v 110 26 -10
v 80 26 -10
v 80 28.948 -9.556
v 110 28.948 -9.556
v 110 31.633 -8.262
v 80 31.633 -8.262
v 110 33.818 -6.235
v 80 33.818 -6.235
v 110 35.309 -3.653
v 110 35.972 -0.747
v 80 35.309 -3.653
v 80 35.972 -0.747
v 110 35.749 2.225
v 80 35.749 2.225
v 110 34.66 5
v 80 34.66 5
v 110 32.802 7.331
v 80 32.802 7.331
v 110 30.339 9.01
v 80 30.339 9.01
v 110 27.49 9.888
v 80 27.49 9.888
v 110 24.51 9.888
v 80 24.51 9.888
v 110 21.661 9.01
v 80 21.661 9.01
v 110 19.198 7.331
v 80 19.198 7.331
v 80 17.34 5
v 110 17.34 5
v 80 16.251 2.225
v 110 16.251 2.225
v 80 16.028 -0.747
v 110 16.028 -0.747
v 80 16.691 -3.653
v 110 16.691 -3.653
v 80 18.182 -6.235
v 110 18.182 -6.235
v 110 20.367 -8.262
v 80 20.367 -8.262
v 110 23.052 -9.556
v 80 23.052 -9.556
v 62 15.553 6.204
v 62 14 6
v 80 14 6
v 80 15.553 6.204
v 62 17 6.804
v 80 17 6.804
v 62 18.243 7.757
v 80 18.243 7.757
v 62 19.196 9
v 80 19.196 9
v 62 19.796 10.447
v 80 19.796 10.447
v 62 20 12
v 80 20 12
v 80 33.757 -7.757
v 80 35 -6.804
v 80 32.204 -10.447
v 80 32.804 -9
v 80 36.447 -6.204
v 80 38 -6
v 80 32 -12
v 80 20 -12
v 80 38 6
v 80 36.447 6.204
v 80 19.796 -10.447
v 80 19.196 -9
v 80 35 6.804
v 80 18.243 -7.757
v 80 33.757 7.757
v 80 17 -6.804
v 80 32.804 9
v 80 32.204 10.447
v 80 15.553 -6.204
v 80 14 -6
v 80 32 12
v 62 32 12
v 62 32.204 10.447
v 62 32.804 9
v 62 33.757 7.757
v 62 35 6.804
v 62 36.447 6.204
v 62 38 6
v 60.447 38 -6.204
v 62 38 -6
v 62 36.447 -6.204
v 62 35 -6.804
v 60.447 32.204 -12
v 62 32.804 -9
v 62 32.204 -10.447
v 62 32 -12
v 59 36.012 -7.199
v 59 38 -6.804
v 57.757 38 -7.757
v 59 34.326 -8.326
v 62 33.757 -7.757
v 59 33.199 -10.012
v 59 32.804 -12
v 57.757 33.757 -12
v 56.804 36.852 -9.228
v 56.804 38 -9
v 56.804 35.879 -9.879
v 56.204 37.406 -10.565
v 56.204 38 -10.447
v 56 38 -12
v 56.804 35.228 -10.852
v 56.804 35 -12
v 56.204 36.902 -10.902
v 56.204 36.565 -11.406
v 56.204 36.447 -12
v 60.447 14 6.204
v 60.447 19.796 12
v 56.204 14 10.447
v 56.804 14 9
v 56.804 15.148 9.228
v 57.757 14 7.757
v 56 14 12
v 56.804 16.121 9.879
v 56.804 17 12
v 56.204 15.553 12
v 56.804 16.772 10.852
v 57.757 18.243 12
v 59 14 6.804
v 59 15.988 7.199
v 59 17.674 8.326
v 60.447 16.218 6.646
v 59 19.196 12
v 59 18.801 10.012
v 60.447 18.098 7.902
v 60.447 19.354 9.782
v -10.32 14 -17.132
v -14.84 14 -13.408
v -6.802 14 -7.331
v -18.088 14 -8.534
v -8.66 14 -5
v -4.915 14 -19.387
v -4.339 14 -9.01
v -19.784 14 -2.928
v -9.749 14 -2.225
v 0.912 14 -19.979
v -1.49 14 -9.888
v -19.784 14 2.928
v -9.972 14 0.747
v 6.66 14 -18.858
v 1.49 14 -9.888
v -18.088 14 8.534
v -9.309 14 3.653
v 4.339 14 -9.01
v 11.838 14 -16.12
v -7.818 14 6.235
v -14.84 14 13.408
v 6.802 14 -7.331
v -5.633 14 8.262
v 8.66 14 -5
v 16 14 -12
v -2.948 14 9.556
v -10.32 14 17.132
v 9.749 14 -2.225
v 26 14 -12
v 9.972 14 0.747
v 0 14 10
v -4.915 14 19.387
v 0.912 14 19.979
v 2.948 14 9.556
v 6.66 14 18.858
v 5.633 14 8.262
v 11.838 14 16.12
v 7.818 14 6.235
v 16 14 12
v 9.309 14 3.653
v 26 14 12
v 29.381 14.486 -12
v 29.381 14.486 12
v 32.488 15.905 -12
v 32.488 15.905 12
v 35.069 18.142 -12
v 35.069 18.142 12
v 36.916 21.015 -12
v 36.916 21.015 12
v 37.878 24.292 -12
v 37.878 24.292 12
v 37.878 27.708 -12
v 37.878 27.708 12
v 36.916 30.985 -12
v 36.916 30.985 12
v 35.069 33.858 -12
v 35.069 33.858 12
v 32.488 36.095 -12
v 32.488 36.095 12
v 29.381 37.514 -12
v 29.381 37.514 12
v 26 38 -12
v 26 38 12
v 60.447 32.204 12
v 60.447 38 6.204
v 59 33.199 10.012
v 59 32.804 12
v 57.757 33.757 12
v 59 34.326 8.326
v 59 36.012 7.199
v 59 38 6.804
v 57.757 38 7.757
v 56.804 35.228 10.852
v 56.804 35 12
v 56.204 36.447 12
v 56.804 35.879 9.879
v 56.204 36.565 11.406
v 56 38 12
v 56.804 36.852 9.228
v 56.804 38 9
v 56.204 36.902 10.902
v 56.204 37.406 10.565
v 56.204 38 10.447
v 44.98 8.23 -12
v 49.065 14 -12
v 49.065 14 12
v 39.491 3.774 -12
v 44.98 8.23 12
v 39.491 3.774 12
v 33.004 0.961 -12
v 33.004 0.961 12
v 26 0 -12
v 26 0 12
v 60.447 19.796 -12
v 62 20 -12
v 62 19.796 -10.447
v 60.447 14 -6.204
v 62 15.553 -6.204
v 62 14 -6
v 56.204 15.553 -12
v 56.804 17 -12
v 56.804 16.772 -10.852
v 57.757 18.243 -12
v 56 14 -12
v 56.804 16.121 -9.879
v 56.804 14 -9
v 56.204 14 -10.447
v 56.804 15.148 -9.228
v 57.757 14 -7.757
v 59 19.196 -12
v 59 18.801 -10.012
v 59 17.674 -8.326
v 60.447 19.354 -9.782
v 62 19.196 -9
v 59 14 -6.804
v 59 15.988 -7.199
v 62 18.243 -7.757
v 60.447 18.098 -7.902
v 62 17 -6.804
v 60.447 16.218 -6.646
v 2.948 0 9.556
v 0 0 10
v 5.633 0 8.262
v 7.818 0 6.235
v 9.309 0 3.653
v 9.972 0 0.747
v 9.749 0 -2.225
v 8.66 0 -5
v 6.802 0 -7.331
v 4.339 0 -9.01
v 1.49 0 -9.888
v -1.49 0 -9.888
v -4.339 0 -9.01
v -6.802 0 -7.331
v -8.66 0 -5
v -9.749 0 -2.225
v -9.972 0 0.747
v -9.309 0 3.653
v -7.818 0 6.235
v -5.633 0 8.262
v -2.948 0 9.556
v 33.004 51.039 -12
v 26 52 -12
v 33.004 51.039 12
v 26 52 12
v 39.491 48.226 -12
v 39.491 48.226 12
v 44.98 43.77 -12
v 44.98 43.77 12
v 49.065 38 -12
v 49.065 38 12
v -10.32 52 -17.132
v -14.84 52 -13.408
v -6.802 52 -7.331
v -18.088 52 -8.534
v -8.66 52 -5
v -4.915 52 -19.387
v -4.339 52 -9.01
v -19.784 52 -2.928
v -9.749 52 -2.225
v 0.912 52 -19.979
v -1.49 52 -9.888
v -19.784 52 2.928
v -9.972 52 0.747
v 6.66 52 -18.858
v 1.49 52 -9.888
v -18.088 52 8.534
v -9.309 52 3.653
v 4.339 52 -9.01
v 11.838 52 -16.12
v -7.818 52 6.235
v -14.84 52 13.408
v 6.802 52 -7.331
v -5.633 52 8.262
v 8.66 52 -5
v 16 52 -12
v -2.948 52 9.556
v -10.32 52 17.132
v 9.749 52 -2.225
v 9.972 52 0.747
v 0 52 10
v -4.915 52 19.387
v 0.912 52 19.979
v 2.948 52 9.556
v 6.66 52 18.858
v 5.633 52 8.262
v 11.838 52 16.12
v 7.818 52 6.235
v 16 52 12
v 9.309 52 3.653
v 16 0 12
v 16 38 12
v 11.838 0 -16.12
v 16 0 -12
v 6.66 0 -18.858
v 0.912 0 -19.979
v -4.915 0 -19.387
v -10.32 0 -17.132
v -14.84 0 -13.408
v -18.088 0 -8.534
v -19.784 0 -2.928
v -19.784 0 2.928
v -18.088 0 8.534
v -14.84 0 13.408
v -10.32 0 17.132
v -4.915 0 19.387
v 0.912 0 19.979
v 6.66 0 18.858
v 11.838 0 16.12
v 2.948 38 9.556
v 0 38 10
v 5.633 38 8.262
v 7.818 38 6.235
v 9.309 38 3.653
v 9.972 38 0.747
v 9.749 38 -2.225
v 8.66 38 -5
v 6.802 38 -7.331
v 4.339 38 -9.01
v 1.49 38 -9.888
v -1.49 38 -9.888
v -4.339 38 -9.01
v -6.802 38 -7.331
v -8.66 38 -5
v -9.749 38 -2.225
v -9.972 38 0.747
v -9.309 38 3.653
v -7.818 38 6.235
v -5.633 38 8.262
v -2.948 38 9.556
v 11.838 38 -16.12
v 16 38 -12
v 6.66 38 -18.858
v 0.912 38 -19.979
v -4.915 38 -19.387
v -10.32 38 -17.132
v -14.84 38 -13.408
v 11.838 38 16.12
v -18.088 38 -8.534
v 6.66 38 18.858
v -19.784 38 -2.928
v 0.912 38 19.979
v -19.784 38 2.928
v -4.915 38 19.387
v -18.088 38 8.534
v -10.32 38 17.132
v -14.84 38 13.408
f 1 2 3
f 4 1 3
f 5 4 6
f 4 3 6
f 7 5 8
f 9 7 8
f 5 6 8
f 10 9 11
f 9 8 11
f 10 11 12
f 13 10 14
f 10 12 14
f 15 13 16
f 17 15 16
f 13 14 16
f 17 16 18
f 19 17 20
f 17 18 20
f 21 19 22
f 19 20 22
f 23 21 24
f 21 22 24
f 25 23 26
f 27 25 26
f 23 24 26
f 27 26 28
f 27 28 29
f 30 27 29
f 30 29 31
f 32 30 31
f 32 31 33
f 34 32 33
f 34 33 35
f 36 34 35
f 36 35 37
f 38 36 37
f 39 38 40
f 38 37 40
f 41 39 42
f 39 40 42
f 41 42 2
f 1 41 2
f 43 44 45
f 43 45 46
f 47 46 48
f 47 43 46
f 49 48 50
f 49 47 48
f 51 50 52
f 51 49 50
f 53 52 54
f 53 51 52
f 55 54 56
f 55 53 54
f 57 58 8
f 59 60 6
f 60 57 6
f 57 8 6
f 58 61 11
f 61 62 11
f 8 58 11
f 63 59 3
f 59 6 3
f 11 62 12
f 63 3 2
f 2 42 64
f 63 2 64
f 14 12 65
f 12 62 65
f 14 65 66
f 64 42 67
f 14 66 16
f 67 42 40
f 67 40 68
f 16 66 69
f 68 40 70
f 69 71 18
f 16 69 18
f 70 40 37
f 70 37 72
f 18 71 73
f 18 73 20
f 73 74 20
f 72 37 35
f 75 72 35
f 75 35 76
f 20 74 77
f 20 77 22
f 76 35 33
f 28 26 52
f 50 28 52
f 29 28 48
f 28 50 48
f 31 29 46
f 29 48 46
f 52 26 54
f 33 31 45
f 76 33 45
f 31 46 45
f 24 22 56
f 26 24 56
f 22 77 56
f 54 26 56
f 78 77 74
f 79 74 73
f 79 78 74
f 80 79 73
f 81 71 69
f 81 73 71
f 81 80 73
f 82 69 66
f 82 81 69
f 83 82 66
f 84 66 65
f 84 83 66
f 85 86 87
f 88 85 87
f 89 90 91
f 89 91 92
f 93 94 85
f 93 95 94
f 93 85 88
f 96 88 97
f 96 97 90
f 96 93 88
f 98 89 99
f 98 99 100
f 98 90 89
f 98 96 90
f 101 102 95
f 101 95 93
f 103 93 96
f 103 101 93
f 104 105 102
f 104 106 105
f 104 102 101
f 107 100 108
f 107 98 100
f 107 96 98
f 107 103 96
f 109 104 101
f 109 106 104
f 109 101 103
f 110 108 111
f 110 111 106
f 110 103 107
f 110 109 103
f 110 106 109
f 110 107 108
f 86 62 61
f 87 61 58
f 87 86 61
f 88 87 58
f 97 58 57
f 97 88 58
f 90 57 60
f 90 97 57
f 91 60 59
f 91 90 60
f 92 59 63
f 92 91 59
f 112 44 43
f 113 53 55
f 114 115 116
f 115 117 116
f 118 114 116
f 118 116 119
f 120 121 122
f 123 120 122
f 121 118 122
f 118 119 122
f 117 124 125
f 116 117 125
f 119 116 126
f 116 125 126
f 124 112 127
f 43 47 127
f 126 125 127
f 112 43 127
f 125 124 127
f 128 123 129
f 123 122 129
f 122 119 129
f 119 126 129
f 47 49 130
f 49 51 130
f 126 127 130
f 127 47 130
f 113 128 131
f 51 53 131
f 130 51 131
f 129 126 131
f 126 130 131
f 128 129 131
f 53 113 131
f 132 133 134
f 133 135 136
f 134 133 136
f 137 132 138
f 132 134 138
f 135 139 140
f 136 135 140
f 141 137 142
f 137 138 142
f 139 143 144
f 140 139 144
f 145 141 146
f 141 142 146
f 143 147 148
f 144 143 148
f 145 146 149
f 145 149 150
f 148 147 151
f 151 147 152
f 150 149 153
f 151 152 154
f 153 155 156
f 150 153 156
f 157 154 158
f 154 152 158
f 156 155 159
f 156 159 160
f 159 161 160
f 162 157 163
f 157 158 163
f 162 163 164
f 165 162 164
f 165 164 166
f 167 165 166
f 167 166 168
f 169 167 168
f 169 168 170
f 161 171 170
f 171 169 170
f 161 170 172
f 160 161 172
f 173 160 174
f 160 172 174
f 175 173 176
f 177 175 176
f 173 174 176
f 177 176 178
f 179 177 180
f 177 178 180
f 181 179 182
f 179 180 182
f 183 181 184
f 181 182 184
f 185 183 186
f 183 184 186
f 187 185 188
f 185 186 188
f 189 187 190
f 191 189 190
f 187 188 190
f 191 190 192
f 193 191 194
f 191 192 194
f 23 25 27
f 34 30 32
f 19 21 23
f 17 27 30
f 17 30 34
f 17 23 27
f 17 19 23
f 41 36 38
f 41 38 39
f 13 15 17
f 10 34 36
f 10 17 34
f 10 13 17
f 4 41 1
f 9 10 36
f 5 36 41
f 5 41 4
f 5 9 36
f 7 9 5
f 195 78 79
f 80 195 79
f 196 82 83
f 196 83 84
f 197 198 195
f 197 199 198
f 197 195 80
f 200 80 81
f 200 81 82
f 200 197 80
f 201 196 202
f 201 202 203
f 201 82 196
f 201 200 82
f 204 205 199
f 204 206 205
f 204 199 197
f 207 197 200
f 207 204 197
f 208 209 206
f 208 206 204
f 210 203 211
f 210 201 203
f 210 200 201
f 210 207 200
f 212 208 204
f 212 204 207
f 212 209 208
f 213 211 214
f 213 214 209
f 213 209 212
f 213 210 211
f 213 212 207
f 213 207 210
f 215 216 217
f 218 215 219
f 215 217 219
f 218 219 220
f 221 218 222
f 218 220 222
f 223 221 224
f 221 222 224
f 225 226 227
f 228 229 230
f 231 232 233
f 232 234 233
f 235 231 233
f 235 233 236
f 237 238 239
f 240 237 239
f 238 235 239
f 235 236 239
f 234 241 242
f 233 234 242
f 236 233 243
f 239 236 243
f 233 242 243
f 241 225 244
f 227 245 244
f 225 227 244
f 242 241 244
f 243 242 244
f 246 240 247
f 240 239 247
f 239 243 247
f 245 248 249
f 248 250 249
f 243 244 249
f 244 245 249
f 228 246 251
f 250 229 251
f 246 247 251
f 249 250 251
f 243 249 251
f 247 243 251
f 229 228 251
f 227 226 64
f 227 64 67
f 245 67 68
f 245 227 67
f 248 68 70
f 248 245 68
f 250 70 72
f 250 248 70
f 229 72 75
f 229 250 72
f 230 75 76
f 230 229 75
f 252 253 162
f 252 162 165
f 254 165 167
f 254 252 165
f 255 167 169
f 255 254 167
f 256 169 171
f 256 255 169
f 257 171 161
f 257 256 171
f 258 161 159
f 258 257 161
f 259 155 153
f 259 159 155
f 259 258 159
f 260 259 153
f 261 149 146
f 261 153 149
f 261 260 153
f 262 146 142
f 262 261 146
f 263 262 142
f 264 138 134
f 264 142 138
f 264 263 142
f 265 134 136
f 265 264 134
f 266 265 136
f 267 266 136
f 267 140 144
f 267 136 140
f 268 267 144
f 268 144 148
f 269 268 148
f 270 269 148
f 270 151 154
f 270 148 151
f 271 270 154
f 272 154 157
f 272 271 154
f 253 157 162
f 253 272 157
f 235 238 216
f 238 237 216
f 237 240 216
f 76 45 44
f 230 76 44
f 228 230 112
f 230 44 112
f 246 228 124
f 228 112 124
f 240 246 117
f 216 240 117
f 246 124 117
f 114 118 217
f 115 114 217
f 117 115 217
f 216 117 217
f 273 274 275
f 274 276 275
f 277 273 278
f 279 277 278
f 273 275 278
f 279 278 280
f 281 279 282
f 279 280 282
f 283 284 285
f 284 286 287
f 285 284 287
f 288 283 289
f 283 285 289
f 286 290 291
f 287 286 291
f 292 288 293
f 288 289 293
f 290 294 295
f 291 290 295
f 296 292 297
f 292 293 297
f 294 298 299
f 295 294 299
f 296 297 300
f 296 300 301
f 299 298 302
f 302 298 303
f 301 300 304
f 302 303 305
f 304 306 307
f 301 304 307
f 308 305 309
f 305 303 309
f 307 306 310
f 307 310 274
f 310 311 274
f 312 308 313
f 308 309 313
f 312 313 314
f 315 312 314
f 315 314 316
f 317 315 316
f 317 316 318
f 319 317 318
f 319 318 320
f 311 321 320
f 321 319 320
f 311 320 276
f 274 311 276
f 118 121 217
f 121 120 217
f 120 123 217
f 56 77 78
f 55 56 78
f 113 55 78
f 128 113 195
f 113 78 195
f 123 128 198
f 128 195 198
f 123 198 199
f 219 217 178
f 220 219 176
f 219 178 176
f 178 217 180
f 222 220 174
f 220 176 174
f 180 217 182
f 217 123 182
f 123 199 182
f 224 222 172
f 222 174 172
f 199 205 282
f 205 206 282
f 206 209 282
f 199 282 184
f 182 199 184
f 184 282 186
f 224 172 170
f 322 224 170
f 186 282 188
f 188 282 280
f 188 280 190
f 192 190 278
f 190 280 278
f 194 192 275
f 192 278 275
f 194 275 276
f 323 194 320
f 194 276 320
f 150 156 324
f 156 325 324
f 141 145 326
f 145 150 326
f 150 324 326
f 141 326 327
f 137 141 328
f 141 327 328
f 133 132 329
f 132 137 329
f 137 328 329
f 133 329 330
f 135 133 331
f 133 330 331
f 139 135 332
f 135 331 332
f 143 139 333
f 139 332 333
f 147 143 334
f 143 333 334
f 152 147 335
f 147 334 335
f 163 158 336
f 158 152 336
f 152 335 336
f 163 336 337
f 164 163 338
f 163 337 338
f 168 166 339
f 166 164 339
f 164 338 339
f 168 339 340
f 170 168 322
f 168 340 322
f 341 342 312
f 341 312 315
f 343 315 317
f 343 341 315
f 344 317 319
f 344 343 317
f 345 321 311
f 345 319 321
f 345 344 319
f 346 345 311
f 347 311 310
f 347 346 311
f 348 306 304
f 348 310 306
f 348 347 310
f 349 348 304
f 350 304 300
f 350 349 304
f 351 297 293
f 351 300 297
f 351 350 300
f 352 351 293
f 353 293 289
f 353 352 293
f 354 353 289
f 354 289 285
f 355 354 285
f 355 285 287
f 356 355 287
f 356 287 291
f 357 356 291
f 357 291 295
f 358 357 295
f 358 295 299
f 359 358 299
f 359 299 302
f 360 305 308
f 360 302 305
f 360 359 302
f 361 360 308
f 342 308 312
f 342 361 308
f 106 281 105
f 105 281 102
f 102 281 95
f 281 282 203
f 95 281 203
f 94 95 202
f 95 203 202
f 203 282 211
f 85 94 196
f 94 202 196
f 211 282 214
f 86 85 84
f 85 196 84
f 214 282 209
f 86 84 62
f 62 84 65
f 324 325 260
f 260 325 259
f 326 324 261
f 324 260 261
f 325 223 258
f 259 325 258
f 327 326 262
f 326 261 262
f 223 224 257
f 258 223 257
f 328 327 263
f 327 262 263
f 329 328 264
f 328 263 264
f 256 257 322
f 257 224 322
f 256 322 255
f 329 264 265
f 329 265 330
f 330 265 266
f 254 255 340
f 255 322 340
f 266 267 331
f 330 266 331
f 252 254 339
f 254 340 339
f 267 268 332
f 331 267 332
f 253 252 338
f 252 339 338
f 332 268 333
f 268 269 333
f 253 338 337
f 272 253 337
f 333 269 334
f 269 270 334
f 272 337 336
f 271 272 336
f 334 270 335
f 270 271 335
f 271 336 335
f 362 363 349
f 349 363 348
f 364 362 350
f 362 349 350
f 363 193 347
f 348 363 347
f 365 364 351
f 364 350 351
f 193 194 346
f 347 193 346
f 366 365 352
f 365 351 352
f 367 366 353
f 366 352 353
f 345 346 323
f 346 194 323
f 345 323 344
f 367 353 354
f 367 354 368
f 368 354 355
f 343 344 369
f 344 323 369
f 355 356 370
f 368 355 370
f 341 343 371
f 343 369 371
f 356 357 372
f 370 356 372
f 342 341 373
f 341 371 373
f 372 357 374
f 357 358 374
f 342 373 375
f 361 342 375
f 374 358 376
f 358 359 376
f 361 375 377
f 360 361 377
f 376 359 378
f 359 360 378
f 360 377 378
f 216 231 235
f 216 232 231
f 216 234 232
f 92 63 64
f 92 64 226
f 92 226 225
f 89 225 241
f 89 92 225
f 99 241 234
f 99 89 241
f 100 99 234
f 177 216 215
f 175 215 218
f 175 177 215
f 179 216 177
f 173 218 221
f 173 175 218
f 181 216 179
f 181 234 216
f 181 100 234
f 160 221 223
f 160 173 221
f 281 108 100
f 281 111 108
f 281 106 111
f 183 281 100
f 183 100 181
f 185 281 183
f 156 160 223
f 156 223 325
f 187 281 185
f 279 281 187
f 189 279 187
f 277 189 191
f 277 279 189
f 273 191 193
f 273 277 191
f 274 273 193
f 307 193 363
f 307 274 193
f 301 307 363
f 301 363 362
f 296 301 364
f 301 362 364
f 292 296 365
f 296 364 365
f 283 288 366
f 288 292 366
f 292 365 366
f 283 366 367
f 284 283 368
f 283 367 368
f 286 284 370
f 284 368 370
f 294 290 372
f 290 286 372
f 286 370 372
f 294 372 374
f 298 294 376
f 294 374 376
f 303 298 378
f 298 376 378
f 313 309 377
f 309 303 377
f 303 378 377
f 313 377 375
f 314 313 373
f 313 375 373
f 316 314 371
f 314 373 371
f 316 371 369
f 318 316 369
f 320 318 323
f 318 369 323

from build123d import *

# Parameters (mm, degrees)
SKETCH1_R               = 20
BOSS_EXTRUDE1_DEPTH     = 52
CUT_EXTRUDE1_DEPTH      = 60.194594348
CUT_EXTRUDE1_DEPTH_BACK = 60.194594348
SKETCH2_R               = 10
BOSS_EXTRUDE8_DEPTH     = 12
SKETCH7_R               = 10
BOSS_EXTRUDE9_DEPTH     = 30
CUT_EXTRUDE2_DEPTH      = 115.47270417
CUT_EXTRUDE2_DEPTH_BACK = 24
SKETCH9_R               = 6
FILLET1_R               = 6
CUT_EXTRUDE3_DEPTH      = 124.304501177
CUT_EXTRUDE3_DEPTH_BACK = 124.304501177
SKETCH11_W              = 42.326213612
SKETCH11_H              = 24


with BuildPart() as part:
    # Sketch1 → Boss-Extrude1 (new body)
    with BuildSketch(Plane(origin=(0, 0, 0), x_dir=(1, 0, 0), z_dir=(0, 1, 0))):
        with Locations(Location((0, 0, 0), (0, 0, 90))):
            Circle(SKETCH1_R)
    extrude(amount=BOSS_EXTRUDE1_DEPTH)

    # Sketch2 → Cut-Extrude1 (cut, two sides: drawn at the far end of the back side and taken through both)
    with BuildSketch(Plane(origin=(0, 52, 0), x_dir=(1, 0, 0), z_dir=(0, 1, 0)).offset(-CUT_EXTRUDE1_DEPTH_BACK)):
        with Locations(Location((0, 0, 0), (0, 0, 270))):
            Circle(SKETCH2_R)
    extrude(amount=CUT_EXTRUDE1_DEPTH + CUT_EXTRUDE1_DEPTH_BACK, mode=Mode.SUBTRACT)

    # Sketch5 → Boss-Extrude8 (add, symmetric)
    with BuildSketch(Plane.XY):
        with BuildLine():
            Line((26, 0), (16, 0))
            Line((16, 0), (16, 14))
            Line((16, 14), (26, 14))
            ThreePointArc((26, 14), (38, 26), (26, 38))
            Line((26, 38), (16, 38))
            Line((16, 38), (16, 52))
            Line((16, 52), (26, 52))
            ThreePointArc((26, 52), (39.490737563, 48.226110771), (49.065125189, 38))
            Line((49.065125189, 38), (80, 38))
            Line((80, 38), (80, 14))
            Line((80, 14), (49.065125189, 14))
            ThreePointArc((49.065125189, 14), (39.490737563, 3.773889229), (26, 0))
        make_face()
    extrude(amount=BOSS_EXTRUDE8_DEPTH, both=True)

    # Sketch7 → Boss-Extrude9 (add)
    with BuildSketch(Plane(origin=(80, 0, 0), x_dir=(0, 0, -1), z_dir=(1, 0, 0))):
        with Locations((0, 26)):
            Circle(SKETCH7_R)
    extrude(amount=BOSS_EXTRUDE9_DEPTH)

    # Sketch9 → Cut-Extrude2 (cut, two sides: drawn at the far end of the back side and taken through both)
    with BuildSketch(Plane(origin=(80, 0, 0), x_dir=(0, 0, -1), z_dir=(1, 0, 0)).offset(-CUT_EXTRUDE2_DEPTH_BACK)):
        with Locations((-12, 38)):
            Circle(SKETCH9_R)
        with Locations((12, 38)):
            Circle(SKETCH9_R)
        with Locations((12, 14)):
            Circle(SKETCH9_R)
        with Locations((-12, 14)):
            Circle(SKETCH9_R)
    extrude(amount=CUT_EXTRUDE2_DEPTH + CUT_EXTRUDE2_DEPTH_BACK, mode=Mode.SUBTRACT)

    # Fillet1
    fillet1_edges = [part.edges().sort_by_distance(p)[0] for p in [
        (56, 18.242640687, -7.757359313),
        (56, 18.242640687, 7.757359313),
        (56, 33.757359313, -7.757359313),
        (56, 33.757359313, 7.757359313),
    ]]
    fillet(fillet1_edges, radius=FILLET1_R - 0.0001)  # a hair under: the kernel refuses the full size

    # Sketch11 → Cut-Extrude3 (cut, two sides: drawn at the far end of the back side and taken through both)
    with BuildSketch(Plane.XY.offset(-CUT_EXTRUDE3_DEPTH_BACK)):
        with Locations((0, 26)):
            Rectangle(SKETCH11_W, SKETCH11_H)
    extrude(amount=CUT_EXTRUDE3_DEPTH + CUT_EXTRUDE3_DEPTH_BACK, mode=Mode.SUBTRACT)


solid = part.part
